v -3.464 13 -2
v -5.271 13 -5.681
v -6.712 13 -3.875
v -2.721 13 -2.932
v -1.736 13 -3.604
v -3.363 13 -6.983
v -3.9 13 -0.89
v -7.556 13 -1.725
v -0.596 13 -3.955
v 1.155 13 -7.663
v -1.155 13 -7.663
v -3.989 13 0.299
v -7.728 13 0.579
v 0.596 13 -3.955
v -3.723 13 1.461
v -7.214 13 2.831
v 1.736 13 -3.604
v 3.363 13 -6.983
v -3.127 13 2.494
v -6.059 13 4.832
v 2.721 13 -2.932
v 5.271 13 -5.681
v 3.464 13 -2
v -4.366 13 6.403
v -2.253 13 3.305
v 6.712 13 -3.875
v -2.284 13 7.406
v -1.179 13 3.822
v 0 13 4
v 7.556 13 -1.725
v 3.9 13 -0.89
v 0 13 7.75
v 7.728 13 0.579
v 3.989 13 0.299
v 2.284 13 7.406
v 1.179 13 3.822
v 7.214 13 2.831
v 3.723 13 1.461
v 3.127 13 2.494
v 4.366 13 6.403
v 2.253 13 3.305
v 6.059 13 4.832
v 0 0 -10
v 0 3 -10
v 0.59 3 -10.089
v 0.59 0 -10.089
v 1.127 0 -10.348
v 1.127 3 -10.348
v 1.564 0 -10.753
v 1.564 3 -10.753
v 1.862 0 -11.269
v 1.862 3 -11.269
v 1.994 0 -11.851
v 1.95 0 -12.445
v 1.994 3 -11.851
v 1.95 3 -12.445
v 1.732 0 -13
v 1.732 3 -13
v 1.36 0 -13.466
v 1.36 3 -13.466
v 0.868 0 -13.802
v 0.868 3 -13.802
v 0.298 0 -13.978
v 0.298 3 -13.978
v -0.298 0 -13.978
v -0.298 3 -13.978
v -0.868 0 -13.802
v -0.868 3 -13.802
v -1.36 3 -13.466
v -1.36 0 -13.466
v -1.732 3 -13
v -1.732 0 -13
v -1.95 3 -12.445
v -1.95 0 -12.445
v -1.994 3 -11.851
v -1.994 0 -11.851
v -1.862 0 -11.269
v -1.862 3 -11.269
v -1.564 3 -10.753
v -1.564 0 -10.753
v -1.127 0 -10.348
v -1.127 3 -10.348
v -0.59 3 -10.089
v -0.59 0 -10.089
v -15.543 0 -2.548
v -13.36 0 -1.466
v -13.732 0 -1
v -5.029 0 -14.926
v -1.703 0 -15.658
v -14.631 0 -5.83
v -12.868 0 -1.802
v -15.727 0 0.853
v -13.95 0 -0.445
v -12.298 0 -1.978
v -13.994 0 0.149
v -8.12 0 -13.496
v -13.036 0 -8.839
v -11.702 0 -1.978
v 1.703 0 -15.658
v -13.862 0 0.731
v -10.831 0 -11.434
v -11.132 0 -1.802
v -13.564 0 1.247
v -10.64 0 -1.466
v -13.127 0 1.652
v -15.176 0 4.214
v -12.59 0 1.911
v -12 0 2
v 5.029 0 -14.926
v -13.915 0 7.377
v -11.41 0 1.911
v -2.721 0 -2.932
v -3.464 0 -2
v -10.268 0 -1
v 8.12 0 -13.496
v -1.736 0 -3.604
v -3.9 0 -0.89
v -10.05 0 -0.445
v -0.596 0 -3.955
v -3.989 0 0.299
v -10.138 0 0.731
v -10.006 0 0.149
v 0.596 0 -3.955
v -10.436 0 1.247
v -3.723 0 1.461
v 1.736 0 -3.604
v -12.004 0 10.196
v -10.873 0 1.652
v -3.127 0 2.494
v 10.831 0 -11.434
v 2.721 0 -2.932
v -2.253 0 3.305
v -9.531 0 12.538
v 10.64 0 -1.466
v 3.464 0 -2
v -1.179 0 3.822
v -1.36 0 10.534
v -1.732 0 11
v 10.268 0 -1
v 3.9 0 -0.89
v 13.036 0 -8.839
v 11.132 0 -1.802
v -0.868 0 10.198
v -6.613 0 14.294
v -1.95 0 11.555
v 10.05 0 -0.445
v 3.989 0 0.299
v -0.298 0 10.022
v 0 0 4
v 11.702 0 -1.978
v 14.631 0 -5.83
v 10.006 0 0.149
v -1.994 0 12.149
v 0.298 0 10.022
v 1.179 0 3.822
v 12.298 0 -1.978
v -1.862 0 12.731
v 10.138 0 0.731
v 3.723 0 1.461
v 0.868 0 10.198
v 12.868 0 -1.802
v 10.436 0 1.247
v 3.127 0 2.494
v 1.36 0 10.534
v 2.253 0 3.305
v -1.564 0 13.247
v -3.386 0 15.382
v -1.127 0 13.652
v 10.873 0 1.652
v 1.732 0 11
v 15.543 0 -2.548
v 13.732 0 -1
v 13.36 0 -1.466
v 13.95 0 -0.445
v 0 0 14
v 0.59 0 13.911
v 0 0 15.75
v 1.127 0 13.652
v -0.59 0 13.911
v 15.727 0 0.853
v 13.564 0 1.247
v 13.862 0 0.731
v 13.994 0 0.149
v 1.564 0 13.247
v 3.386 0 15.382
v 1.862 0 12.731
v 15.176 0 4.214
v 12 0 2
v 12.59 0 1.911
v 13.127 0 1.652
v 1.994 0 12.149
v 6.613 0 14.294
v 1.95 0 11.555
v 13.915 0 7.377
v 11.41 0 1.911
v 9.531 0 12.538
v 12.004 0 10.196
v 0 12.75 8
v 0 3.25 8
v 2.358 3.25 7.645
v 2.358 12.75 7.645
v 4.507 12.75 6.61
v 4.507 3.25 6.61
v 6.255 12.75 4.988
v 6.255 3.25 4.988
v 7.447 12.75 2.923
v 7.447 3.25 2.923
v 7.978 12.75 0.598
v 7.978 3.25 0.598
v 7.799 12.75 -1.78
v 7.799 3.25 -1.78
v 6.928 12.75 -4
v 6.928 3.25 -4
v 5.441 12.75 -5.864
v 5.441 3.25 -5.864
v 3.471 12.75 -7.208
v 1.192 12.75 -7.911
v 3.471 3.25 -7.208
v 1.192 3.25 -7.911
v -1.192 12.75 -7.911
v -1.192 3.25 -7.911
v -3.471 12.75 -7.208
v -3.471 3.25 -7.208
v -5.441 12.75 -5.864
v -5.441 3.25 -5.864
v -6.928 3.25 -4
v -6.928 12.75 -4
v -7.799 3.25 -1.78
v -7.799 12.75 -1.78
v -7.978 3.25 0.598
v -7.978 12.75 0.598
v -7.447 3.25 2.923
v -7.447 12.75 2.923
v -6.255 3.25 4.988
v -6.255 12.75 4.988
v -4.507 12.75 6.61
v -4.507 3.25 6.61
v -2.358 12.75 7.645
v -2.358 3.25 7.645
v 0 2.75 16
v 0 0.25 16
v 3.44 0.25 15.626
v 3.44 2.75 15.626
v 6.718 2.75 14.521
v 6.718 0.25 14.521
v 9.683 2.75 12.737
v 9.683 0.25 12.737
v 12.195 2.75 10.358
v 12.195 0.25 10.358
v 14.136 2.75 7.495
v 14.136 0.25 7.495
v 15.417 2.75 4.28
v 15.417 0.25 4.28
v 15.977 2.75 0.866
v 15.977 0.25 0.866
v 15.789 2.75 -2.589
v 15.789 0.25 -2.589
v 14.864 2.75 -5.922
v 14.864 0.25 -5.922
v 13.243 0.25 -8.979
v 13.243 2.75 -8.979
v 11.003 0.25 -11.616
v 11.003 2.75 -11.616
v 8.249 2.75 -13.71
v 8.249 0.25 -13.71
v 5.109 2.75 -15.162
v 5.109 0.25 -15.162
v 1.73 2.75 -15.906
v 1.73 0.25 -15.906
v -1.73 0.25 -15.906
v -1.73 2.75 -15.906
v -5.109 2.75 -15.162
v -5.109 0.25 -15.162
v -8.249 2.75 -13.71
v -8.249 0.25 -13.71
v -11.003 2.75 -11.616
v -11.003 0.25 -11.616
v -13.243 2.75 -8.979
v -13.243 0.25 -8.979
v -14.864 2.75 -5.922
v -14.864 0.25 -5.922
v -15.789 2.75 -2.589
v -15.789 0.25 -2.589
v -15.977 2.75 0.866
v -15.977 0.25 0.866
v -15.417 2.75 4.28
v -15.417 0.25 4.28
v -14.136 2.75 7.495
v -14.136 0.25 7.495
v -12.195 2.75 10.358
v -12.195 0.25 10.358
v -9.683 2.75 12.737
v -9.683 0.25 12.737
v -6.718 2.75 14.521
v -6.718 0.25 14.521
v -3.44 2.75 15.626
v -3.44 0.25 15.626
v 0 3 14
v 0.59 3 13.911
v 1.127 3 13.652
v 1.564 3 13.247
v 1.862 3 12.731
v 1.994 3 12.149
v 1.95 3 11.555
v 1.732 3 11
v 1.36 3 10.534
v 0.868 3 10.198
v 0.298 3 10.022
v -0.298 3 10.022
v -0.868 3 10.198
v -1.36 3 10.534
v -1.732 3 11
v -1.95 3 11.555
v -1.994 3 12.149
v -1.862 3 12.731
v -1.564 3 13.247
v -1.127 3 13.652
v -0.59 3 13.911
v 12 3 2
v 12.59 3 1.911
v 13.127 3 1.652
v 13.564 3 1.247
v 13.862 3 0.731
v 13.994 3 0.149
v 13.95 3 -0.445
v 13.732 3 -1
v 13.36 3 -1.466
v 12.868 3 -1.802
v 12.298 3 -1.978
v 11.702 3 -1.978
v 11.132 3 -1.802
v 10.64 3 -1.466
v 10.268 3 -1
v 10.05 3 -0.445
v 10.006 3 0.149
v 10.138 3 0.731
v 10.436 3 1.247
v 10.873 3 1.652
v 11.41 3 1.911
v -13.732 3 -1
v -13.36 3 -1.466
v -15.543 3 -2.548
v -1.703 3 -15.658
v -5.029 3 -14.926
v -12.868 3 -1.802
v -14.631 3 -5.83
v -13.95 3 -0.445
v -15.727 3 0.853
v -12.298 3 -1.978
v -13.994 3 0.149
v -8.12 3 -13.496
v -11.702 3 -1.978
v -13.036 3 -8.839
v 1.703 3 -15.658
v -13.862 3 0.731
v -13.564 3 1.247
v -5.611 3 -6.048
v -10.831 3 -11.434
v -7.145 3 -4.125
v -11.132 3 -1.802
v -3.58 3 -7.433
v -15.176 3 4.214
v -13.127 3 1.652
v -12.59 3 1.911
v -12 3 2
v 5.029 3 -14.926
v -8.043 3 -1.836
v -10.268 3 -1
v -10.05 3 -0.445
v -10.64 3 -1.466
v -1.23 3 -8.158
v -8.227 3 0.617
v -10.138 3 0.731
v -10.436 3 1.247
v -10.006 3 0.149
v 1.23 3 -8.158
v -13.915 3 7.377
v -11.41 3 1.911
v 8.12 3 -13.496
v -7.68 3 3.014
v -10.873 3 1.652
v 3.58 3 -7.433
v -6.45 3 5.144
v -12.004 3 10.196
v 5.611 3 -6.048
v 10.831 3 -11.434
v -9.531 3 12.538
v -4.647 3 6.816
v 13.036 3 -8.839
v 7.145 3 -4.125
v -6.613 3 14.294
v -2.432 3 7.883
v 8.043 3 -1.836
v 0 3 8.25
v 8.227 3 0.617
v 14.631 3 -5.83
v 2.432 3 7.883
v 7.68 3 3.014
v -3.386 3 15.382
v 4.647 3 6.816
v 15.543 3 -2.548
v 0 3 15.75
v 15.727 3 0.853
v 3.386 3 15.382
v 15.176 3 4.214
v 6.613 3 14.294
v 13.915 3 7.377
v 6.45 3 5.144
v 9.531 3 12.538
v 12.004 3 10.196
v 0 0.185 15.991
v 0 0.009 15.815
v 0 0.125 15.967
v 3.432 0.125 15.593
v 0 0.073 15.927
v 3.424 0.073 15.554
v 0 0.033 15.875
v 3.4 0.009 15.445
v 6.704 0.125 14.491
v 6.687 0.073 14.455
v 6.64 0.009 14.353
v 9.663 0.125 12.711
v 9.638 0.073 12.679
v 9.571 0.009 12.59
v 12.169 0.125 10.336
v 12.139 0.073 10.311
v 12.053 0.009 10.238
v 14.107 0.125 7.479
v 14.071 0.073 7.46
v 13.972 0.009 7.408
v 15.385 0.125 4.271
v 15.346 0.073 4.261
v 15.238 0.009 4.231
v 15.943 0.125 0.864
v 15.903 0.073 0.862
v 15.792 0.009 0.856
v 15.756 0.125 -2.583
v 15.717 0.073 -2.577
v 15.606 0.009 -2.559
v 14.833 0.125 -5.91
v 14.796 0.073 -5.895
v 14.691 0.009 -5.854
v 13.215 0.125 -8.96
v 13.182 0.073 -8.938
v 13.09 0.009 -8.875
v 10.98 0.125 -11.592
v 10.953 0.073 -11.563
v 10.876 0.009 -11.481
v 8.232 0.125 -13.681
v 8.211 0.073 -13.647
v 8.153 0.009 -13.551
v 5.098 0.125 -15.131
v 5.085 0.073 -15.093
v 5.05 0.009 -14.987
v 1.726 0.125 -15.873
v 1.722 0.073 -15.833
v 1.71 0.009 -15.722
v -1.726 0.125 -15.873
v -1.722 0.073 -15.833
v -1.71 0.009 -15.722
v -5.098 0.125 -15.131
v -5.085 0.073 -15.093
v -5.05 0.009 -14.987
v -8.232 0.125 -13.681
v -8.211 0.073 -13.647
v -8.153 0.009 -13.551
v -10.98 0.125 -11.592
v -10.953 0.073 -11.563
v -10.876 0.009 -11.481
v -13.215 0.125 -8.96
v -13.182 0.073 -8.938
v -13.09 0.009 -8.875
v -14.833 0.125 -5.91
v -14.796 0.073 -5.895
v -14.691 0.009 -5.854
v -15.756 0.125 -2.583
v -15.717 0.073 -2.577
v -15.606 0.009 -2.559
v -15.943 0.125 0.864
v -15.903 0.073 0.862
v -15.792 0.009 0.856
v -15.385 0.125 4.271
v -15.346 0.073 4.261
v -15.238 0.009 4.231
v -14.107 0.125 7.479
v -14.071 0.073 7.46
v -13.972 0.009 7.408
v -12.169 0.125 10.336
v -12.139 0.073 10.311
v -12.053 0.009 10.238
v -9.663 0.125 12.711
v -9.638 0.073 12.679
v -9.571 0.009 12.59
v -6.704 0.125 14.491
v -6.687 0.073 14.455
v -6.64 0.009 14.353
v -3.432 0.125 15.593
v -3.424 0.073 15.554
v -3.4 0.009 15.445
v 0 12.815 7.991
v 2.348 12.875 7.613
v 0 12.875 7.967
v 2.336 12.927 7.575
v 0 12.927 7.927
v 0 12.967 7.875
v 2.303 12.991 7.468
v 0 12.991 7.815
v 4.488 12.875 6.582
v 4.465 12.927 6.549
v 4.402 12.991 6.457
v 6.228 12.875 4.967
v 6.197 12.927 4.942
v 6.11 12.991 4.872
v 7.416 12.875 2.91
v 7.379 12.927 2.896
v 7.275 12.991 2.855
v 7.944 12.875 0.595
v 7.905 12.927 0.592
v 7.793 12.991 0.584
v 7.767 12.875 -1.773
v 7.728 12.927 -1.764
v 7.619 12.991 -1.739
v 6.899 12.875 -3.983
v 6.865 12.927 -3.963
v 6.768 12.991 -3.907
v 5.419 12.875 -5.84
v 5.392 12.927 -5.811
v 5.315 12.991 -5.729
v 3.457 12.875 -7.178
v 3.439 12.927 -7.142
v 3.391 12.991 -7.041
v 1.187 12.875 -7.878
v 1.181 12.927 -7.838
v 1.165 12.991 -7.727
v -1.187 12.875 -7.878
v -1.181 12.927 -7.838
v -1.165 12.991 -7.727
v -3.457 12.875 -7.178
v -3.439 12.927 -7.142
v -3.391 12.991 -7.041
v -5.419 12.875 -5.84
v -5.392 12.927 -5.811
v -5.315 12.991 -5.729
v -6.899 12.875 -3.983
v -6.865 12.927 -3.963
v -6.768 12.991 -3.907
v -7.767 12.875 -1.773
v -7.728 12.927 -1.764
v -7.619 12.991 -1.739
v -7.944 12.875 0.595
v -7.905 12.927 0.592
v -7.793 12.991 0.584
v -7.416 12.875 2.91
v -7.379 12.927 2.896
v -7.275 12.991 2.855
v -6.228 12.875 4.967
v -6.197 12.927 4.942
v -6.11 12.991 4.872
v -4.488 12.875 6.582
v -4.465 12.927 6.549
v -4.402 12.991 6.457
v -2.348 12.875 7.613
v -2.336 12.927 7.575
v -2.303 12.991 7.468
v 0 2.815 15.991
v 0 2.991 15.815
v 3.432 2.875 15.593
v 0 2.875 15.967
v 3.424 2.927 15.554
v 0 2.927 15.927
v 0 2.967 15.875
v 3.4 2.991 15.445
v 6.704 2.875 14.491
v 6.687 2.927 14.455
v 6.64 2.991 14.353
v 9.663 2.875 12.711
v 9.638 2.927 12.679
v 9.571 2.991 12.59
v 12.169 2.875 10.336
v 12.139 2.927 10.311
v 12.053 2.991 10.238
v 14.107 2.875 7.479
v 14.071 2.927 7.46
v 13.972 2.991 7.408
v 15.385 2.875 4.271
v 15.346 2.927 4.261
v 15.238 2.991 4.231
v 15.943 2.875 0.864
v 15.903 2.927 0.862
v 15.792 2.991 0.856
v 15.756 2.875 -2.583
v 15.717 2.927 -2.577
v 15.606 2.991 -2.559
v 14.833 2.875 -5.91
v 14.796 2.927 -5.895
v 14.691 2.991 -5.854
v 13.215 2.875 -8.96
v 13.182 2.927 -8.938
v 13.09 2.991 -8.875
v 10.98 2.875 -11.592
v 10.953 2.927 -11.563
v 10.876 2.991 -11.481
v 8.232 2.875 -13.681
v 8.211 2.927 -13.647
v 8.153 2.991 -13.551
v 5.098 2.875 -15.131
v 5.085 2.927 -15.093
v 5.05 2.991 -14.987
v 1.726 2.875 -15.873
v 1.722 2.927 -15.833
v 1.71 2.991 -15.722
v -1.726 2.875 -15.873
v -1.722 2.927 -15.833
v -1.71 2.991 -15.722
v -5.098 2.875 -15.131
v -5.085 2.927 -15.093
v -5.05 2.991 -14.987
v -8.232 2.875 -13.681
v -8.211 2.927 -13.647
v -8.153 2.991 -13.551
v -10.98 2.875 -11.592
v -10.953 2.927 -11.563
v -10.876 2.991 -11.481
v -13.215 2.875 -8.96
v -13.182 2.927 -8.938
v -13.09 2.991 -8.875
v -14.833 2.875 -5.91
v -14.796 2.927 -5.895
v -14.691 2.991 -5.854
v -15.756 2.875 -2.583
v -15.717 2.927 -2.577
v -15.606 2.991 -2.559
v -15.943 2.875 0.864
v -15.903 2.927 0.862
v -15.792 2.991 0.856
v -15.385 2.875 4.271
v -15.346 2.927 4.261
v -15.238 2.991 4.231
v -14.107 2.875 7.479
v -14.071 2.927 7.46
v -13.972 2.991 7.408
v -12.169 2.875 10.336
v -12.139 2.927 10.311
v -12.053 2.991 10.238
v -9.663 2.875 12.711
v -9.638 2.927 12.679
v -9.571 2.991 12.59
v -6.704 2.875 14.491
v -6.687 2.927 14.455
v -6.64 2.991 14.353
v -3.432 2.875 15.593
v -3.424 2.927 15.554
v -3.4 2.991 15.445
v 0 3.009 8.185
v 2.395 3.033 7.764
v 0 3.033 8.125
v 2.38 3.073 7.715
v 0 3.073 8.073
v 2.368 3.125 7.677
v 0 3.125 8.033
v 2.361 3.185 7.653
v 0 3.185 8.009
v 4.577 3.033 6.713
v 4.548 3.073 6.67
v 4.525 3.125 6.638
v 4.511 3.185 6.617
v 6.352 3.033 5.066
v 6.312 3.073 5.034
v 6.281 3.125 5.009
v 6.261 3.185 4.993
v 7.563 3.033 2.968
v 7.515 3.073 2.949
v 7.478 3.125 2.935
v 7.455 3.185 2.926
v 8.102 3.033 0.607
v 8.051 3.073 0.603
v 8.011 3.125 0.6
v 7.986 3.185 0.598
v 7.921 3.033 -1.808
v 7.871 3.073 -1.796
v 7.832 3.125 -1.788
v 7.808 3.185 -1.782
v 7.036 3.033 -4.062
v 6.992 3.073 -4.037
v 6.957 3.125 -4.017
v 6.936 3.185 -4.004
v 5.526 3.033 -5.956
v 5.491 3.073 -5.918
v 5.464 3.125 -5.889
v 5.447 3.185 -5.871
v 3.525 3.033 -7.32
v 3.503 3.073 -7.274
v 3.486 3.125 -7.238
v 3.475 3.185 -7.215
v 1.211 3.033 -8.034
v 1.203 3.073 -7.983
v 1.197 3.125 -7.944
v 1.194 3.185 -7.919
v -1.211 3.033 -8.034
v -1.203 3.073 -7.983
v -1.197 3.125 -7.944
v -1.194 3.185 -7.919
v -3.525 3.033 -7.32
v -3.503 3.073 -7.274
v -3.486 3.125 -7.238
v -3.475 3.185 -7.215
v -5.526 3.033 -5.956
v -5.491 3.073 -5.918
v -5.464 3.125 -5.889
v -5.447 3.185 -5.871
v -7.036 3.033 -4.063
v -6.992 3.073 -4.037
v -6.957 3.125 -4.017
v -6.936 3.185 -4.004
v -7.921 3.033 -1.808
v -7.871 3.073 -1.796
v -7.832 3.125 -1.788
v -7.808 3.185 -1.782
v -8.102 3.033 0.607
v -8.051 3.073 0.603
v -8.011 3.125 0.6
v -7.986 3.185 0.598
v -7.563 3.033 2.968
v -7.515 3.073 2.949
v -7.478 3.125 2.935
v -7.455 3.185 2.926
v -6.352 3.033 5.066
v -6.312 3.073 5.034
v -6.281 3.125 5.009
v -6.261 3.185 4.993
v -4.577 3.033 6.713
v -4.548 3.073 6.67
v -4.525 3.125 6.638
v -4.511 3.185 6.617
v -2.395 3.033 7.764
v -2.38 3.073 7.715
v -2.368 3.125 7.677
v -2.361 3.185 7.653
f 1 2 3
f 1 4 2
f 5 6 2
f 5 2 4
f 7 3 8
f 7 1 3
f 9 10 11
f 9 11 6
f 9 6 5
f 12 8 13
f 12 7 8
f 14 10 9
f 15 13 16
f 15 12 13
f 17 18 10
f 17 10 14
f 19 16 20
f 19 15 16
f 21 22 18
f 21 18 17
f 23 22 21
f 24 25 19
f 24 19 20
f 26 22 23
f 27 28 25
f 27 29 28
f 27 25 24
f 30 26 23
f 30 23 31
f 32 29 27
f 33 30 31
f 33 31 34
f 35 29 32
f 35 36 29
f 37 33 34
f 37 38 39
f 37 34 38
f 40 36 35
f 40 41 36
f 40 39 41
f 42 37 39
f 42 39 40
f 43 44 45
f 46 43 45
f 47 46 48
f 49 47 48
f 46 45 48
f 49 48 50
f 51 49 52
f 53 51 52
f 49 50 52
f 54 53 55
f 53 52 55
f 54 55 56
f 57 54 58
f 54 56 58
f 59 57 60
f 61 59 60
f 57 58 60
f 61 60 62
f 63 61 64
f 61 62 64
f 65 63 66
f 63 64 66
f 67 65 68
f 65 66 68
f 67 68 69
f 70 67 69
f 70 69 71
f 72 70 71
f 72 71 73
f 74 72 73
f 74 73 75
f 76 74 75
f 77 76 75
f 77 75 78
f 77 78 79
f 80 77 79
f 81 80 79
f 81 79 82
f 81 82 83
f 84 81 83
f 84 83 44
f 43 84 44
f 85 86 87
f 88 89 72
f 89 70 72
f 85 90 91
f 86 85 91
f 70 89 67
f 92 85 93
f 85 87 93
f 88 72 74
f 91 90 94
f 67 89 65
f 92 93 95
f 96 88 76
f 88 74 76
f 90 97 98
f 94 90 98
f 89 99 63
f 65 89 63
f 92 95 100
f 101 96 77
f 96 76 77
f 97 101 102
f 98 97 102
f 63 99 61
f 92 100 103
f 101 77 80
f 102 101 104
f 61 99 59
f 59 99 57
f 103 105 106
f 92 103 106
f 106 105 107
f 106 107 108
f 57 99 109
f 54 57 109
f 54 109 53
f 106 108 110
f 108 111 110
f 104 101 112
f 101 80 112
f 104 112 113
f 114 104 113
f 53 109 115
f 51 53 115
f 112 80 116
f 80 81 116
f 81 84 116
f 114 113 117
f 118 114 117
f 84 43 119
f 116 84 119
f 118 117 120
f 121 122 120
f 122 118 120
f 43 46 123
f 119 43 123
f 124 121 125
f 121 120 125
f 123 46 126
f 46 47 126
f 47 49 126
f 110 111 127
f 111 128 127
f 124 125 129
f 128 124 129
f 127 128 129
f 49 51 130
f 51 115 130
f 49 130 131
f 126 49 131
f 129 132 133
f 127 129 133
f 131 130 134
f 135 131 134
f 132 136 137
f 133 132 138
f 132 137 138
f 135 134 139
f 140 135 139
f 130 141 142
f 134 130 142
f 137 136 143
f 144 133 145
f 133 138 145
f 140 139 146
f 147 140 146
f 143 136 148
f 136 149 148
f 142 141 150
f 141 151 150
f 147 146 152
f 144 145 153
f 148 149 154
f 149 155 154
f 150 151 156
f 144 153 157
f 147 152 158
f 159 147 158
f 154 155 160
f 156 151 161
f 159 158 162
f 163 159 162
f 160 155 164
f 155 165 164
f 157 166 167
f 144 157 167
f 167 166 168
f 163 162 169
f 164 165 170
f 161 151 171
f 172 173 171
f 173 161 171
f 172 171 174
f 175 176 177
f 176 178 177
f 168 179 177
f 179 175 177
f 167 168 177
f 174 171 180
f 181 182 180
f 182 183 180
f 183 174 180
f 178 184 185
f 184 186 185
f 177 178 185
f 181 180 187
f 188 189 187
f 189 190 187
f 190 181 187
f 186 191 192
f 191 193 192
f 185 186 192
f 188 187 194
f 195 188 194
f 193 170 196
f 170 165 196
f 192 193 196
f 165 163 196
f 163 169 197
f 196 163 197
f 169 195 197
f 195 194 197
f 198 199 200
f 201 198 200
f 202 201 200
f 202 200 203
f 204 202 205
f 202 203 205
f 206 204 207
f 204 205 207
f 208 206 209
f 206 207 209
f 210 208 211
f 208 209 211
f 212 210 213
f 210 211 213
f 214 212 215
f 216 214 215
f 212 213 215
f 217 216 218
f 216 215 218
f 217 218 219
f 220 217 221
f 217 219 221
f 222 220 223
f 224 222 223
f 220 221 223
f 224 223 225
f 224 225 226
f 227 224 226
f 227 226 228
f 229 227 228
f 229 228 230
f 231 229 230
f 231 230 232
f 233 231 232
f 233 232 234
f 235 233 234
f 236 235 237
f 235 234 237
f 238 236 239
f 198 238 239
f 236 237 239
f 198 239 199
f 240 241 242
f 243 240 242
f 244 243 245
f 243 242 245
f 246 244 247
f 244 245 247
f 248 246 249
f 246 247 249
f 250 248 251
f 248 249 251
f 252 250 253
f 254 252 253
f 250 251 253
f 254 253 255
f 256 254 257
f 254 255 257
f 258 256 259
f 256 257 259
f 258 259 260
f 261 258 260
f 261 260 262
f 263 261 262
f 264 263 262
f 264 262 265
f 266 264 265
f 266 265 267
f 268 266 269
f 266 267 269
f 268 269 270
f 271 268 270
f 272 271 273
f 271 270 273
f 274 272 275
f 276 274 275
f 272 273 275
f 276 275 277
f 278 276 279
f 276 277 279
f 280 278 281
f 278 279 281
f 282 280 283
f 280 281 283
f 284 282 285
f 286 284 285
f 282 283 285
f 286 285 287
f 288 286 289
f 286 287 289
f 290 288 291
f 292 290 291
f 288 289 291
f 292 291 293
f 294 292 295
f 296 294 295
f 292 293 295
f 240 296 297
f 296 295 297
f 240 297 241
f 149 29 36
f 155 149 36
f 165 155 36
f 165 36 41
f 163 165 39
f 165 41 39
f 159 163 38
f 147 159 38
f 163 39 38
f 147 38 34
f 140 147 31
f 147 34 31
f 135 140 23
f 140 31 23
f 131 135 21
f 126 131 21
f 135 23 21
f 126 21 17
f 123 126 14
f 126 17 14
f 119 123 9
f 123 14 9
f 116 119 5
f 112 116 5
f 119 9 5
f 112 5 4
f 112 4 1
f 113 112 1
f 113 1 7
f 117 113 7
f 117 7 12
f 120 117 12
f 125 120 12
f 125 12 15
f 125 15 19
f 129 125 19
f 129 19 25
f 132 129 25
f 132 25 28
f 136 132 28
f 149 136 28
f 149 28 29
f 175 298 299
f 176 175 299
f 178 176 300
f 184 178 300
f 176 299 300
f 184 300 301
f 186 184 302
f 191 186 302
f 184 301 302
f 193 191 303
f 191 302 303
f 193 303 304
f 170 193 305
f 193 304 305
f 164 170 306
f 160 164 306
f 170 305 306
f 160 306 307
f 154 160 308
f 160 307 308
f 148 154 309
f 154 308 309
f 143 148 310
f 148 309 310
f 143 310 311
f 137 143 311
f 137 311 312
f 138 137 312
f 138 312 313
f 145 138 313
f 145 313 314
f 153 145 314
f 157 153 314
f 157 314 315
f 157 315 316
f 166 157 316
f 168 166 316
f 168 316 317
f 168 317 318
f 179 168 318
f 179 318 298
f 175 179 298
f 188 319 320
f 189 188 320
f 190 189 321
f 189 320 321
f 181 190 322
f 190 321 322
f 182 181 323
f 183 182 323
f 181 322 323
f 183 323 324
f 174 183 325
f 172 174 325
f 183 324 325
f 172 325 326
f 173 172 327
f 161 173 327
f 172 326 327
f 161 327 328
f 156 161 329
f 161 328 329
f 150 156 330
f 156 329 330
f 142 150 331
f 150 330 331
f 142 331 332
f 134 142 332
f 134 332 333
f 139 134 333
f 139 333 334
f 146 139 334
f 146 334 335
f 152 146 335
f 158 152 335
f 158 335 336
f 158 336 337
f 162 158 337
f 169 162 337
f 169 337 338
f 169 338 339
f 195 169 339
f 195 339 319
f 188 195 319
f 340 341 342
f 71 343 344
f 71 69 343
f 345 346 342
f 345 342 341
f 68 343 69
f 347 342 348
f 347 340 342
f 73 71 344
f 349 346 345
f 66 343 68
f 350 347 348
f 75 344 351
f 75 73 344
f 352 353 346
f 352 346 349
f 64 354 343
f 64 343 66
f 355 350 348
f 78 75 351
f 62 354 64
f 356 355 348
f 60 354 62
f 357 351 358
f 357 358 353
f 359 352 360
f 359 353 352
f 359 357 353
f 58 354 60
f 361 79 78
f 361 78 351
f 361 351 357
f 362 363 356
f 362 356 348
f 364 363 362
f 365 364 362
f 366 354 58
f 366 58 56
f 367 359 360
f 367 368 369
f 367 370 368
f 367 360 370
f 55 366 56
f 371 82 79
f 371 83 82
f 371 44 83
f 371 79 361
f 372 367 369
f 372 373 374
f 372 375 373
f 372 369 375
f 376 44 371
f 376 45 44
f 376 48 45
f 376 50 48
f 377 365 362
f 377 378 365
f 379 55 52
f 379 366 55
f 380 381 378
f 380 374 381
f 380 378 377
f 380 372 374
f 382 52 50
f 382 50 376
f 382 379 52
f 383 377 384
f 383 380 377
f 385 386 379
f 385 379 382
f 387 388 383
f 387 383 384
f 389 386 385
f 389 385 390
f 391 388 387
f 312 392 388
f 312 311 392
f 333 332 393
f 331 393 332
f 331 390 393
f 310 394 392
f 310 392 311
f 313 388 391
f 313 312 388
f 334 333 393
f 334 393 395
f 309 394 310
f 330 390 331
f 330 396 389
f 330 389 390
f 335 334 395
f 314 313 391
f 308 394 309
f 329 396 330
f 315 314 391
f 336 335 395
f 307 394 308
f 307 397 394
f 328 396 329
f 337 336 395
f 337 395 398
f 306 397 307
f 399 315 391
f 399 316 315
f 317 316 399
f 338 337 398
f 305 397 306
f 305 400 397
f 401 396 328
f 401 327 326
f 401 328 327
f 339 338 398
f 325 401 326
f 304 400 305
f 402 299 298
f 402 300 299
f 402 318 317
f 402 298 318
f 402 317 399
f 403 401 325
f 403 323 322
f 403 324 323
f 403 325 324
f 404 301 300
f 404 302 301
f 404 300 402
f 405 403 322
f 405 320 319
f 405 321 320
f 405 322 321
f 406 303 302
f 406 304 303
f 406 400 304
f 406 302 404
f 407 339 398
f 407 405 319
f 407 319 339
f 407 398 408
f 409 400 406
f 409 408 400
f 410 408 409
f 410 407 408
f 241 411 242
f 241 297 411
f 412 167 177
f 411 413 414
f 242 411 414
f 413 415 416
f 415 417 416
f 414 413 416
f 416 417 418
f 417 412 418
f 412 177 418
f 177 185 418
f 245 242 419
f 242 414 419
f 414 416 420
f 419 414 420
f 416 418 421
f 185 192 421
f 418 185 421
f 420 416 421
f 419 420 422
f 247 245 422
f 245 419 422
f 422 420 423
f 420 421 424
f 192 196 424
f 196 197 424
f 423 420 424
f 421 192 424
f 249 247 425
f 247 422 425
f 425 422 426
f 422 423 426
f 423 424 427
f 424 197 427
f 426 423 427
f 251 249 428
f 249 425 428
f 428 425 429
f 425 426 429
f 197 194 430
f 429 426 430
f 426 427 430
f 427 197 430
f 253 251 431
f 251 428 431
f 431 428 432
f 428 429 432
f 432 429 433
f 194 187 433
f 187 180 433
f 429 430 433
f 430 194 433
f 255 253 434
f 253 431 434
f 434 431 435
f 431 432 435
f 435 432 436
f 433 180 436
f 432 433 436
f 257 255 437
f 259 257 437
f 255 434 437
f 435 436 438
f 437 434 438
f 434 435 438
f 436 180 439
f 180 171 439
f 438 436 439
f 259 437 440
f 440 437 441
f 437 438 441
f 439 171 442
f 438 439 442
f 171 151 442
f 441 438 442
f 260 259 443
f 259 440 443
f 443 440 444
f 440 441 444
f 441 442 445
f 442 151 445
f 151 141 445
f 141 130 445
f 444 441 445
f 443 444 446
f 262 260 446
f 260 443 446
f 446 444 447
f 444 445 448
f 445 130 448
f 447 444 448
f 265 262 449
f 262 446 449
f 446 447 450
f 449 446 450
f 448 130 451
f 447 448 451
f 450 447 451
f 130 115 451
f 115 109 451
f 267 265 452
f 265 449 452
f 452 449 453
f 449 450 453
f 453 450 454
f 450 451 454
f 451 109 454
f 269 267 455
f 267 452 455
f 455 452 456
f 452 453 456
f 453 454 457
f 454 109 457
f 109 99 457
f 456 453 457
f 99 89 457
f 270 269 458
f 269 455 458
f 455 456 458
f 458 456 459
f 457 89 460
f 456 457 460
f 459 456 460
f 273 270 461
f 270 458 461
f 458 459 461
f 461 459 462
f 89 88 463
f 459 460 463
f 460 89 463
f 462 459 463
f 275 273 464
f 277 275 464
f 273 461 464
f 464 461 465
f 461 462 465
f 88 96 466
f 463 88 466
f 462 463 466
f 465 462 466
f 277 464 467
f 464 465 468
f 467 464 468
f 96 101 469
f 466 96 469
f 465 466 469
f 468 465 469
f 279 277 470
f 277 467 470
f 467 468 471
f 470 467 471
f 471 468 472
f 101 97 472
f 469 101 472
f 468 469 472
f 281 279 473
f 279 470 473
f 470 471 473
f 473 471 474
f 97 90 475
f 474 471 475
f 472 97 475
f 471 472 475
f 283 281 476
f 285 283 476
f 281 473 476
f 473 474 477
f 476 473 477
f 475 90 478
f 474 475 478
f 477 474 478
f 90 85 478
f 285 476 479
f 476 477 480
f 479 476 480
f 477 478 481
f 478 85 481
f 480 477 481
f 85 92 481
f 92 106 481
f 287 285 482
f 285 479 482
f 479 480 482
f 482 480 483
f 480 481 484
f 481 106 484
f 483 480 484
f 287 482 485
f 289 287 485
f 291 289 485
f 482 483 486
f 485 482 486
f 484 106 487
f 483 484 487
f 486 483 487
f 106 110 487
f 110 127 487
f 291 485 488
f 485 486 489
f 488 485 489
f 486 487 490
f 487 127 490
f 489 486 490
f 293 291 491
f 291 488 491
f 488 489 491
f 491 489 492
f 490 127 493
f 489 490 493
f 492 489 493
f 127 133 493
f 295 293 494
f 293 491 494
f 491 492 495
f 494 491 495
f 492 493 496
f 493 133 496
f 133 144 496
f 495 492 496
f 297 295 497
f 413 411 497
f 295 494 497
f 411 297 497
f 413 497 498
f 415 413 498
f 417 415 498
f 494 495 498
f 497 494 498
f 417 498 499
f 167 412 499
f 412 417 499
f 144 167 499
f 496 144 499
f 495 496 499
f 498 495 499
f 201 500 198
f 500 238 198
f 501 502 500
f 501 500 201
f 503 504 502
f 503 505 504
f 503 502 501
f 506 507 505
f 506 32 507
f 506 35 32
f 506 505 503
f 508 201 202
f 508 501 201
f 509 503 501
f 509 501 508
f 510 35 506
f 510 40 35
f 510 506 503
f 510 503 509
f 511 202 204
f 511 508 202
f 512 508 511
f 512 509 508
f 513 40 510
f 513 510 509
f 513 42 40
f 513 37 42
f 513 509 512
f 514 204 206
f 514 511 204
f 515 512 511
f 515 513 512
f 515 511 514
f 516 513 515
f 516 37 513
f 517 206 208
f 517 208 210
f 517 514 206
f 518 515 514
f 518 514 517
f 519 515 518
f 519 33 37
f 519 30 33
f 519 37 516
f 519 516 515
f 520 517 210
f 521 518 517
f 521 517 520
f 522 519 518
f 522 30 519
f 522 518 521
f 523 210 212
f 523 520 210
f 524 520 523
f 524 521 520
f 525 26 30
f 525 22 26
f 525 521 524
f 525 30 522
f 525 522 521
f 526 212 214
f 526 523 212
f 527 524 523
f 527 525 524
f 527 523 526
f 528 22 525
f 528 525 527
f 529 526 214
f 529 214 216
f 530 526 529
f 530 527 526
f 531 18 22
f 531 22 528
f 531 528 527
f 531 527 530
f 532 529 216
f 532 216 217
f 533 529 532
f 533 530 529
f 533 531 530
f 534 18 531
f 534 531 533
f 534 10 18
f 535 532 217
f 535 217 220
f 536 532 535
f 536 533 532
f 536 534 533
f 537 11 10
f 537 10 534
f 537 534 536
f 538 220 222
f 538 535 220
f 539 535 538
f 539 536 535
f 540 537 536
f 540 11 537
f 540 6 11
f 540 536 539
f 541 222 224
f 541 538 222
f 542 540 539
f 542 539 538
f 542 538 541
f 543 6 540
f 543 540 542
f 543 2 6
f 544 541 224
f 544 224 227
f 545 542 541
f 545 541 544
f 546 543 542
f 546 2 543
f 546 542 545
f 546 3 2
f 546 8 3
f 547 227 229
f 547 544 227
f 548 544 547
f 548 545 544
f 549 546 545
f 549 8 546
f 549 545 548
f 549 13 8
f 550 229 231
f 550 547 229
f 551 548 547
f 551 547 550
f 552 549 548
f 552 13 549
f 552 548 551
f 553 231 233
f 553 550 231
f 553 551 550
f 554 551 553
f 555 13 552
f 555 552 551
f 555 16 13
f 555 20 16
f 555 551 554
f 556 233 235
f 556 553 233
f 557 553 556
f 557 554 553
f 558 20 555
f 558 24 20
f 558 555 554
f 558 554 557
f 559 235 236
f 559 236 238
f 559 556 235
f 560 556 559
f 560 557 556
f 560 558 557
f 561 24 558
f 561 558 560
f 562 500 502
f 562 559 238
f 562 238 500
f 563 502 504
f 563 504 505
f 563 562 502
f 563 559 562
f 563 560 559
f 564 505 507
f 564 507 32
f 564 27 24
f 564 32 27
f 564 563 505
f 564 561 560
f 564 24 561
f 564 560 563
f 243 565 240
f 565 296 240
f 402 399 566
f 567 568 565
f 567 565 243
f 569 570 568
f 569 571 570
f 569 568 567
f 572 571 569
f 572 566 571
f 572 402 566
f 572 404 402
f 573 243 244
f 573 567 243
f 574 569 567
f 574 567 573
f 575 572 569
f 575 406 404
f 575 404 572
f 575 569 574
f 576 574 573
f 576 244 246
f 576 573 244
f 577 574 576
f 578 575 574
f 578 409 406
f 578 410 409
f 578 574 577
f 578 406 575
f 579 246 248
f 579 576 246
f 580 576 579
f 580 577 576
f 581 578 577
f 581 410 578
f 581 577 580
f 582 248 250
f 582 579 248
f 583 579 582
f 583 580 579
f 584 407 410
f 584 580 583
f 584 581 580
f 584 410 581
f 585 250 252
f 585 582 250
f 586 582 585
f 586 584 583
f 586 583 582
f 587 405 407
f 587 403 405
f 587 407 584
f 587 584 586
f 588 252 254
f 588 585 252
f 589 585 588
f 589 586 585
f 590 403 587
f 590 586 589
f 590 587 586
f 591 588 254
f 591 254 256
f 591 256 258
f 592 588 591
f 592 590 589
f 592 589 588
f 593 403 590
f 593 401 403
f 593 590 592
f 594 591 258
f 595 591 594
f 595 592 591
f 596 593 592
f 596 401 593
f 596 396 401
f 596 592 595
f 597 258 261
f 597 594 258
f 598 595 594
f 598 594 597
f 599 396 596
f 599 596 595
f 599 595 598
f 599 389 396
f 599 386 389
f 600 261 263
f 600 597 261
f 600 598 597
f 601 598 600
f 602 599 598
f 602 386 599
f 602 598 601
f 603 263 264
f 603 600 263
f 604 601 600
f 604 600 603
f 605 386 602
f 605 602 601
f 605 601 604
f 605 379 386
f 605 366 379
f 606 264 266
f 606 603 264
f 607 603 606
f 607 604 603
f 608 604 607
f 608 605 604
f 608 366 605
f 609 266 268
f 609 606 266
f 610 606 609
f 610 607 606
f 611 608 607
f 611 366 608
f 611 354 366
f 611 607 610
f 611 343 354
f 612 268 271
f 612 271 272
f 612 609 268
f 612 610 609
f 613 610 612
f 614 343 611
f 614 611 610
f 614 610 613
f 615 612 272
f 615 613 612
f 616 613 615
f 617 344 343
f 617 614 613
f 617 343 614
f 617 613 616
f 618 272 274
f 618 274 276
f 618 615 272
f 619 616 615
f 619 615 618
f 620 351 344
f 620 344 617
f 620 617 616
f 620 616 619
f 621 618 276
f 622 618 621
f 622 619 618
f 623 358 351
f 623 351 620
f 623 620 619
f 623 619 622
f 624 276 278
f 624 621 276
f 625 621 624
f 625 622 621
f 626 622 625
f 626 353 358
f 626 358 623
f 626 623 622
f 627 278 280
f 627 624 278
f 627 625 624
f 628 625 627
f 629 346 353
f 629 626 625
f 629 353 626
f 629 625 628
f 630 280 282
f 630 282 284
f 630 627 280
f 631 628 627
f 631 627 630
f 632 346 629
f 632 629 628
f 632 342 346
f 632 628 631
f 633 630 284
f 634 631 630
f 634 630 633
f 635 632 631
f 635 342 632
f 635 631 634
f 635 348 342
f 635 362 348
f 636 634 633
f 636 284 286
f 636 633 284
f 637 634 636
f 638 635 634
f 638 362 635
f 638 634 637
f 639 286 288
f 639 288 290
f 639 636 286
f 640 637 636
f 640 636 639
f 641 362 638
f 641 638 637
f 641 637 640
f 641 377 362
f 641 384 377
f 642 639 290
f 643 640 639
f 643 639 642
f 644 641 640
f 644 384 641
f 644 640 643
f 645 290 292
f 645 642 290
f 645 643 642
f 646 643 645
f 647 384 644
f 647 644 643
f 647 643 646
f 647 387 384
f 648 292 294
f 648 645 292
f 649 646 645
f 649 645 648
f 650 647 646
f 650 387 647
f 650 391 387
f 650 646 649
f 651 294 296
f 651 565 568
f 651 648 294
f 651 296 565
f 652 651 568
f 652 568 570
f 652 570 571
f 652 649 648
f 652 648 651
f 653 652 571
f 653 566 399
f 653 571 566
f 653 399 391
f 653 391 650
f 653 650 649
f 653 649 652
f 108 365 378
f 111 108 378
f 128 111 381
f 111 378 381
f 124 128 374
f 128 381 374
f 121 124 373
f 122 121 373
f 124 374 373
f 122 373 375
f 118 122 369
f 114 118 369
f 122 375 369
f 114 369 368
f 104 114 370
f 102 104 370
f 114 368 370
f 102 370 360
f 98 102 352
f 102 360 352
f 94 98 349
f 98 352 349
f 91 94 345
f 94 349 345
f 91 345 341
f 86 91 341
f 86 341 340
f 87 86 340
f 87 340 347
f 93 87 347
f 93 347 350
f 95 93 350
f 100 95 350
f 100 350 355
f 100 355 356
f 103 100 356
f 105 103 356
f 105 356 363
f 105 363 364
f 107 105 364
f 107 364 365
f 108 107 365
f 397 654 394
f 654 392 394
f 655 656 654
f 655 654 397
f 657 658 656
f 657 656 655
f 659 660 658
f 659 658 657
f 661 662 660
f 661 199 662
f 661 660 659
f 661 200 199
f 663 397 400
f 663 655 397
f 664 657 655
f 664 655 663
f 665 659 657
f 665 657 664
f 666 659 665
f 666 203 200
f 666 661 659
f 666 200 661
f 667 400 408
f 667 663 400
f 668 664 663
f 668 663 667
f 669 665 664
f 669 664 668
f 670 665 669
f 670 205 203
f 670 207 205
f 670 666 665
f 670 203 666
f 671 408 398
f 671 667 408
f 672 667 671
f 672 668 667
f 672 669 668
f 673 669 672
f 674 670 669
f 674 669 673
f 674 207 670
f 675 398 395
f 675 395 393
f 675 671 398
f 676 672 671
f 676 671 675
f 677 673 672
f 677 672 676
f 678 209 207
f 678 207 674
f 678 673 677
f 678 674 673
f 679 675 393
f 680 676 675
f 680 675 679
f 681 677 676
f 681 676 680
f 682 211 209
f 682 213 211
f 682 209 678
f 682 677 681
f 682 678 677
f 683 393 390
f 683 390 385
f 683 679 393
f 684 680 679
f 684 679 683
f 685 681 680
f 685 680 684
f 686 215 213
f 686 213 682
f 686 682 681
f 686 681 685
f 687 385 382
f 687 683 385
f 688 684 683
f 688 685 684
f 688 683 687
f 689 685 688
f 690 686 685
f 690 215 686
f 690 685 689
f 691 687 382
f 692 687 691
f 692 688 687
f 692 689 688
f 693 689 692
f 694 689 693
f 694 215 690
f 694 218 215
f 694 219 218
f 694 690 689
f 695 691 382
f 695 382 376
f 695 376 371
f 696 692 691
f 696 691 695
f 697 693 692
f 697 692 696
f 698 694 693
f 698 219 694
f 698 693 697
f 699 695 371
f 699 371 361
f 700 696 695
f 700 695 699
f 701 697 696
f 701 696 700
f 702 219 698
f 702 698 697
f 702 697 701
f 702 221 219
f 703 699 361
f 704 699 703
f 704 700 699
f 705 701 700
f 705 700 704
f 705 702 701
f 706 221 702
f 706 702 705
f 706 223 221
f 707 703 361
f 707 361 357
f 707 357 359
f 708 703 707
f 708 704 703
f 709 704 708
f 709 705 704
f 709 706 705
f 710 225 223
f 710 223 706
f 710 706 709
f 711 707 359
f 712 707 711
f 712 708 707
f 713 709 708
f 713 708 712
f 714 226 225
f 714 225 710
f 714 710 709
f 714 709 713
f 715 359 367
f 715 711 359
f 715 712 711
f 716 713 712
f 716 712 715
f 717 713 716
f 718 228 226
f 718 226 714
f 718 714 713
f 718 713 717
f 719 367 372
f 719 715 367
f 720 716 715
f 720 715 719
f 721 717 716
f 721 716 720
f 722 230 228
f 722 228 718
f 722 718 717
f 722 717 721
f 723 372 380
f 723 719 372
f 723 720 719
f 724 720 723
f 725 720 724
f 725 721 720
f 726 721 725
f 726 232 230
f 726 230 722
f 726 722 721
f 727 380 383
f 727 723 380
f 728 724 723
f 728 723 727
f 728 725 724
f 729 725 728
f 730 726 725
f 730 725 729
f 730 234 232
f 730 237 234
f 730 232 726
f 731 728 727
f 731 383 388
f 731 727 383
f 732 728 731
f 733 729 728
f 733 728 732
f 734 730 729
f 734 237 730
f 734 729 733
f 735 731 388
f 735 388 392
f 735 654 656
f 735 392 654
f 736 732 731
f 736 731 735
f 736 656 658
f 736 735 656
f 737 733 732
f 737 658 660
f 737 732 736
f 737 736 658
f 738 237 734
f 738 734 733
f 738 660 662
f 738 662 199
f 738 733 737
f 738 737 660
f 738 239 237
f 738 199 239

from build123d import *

# Parameters (mm, degrees)
SKETCH1_R           = 16
BOSS_EXTRUDE1_DEPTH = 3
FILLET1_R           = 0.25
SKETCH2_R           = 8
BOSS_EXTRUDE2_DEPTH = 10
FILLET2_R           = 0.25
CUT_EXTRUDE1_REACH  = 28.096
SKETCH3_R           = 4
CUT_EXTRUDE2_REACH  = 26.739
SKETCH4_R           = 2


with BuildPart() as part:
    # Sketch1 → Boss-Extrude1 (new body)
    with BuildSketch(Plane(origin=(0, 0, 0), x_dir=(1, 0, 0), z_dir=(0, 1, 0))):
        with Locations(Location((0, 0, 0), (0, 0, 270))):
            Circle(SKETCH1_R)
    extrude(amount=BOSS_EXTRUDE1_DEPTH)

    # Fillet1
    fillet1_edges = [part.edges().sort_by_distance(p)[0] for p in [
        (0, 0, -16),
        (0, 3, -16),
    ]]
    fillet(fillet1_edges, radius=FILLET1_R)

    # Sketch2 → Boss-Extrude2 (add)
    with BuildSketch(Plane(origin=(0, 3, 0), x_dir=(1, 0, 0), z_dir=(0, 1, 0))):
        with Locations(Location((0, 0, 0), (0, 0, 270))):
            Circle(SKETCH2_R)
    extrude(amount=BOSS_EXTRUDE2_DEPTH)

    # Fillet2
    fillet2_edges = [part.edges().sort_by_distance(p)[0] for p in [
        (0, 3, -8),
        (0, 13, -8),
    ]]
    fillet(fillet2_edges, radius=FILLET2_R)

    # Sketch3 → Cut-Extrude1 (cut, up to next)
    with BuildSketch(Plane(origin=(0, 13, 0), x_dir=(1, 0, 0), z_dir=(0, 1, 0)), mode=Mode.PRIVATE) as cut_extrude1_sk1:
        with Locations(Location((0, 0, 0), (0, 0, 270))):
            Circle(SKETCH3_R)
    cut_extrude1_tool1 = extrude(cut_extrude1_sk1.sketch, amount=-CUT_EXTRUDE1_REACH, mode=Mode.PRIVATE) & part.part
    add(cut_extrude1_tool1.solids().sort_by_distance((0, 13, 0))[0], mode=Mode.SUBTRACT)

    # Sketch4 → Cut-Extrude2 (cut, up to next)
    with BuildSketch(Plane(origin=(0, 3, 0), x_dir=(1, 0, 0), z_dir=(0, 1, 0)), mode=Mode.PRIVATE) as cut_extrude2_sk1:
        with Locations(Location((0, 12, 0), (0, 0, 270))):
            Circle(SKETCH4_R)
    cut_extrude2_tool1 = extrude(cut_extrude2_sk1.sketch, amount=-CUT_EXTRUDE2_REACH, mode=Mode.PRIVATE) & part.part
    # Sketch4 → Cut-Extrude2 (cut, up to next)
    with BuildSketch(Plane(origin=(0, 3, 0), x_dir=(1, 0, 0), z_dir=(0, 1, 0)), mode=Mode.PRIVATE) as cut_extrude2_sk2:
        with Locations(Location((-12, 0, 0), (0, 0, 270))):
            Circle(SKETCH4_R)
    cut_extrude2_tool2 = extrude(cut_extrude2_sk2.sketch, amount=-CUT_EXTRUDE2_REACH, mode=Mode.PRIVATE) & part.part
    # Sketch4 → Cut-Extrude2 (cut, up to next)
    with BuildSketch(Plane(origin=(0, 3, 0), x_dir=(1, 0, 0), z_dir=(0, 1, 0)), mode=Mode.PRIVATE) as cut_extrude2_sk3:
        with Locations(Location((0, -12, 0), (0, 0, 270))):
            Circle(SKETCH4_R)
    cut_extrude2_tool3 = extrude(cut_extrude2_sk3.sketch, amount=-CUT_EXTRUDE2_REACH, mode=Mode.PRIVATE) & part.part
    # Sketch4 → Cut-Extrude2 (cut, up to next)
    with BuildSketch(Plane(origin=(0, 3, 0), x_dir=(1, 0, 0), z_dir=(0, 1, 0)), mode=Mode.PRIVATE) as cut_extrude2_sk4:
        with Locations(Location((12, 0, 0), (0, 0, 270))):
            Circle(SKETCH4_R)
    cut_extrude2_tool4 = extrude(cut_extrude2_sk4.sketch, amount=-CUT_EXTRUDE2_REACH, mode=Mode.PRIVATE) & part.part
    add(cut_extrude2_tool1.solids().sort_by_distance((0, 3, -12))[0], mode=Mode.SUBTRACT)
    add(cut_extrude2_tool2.solids().sort_by_distance((-12, 3, 0))[0], mode=Mode.SUBTRACT)
    add(cut_extrude2_tool3.solids().sort_by_distance((0, 3, 12))[0], mode=Mode.SUBTRACT)
    add(cut_extrude2_tool4.solids().sort_by_distance((12, 3, 0))[0], mode=Mode.SUBTRACT)


solid = part.part
